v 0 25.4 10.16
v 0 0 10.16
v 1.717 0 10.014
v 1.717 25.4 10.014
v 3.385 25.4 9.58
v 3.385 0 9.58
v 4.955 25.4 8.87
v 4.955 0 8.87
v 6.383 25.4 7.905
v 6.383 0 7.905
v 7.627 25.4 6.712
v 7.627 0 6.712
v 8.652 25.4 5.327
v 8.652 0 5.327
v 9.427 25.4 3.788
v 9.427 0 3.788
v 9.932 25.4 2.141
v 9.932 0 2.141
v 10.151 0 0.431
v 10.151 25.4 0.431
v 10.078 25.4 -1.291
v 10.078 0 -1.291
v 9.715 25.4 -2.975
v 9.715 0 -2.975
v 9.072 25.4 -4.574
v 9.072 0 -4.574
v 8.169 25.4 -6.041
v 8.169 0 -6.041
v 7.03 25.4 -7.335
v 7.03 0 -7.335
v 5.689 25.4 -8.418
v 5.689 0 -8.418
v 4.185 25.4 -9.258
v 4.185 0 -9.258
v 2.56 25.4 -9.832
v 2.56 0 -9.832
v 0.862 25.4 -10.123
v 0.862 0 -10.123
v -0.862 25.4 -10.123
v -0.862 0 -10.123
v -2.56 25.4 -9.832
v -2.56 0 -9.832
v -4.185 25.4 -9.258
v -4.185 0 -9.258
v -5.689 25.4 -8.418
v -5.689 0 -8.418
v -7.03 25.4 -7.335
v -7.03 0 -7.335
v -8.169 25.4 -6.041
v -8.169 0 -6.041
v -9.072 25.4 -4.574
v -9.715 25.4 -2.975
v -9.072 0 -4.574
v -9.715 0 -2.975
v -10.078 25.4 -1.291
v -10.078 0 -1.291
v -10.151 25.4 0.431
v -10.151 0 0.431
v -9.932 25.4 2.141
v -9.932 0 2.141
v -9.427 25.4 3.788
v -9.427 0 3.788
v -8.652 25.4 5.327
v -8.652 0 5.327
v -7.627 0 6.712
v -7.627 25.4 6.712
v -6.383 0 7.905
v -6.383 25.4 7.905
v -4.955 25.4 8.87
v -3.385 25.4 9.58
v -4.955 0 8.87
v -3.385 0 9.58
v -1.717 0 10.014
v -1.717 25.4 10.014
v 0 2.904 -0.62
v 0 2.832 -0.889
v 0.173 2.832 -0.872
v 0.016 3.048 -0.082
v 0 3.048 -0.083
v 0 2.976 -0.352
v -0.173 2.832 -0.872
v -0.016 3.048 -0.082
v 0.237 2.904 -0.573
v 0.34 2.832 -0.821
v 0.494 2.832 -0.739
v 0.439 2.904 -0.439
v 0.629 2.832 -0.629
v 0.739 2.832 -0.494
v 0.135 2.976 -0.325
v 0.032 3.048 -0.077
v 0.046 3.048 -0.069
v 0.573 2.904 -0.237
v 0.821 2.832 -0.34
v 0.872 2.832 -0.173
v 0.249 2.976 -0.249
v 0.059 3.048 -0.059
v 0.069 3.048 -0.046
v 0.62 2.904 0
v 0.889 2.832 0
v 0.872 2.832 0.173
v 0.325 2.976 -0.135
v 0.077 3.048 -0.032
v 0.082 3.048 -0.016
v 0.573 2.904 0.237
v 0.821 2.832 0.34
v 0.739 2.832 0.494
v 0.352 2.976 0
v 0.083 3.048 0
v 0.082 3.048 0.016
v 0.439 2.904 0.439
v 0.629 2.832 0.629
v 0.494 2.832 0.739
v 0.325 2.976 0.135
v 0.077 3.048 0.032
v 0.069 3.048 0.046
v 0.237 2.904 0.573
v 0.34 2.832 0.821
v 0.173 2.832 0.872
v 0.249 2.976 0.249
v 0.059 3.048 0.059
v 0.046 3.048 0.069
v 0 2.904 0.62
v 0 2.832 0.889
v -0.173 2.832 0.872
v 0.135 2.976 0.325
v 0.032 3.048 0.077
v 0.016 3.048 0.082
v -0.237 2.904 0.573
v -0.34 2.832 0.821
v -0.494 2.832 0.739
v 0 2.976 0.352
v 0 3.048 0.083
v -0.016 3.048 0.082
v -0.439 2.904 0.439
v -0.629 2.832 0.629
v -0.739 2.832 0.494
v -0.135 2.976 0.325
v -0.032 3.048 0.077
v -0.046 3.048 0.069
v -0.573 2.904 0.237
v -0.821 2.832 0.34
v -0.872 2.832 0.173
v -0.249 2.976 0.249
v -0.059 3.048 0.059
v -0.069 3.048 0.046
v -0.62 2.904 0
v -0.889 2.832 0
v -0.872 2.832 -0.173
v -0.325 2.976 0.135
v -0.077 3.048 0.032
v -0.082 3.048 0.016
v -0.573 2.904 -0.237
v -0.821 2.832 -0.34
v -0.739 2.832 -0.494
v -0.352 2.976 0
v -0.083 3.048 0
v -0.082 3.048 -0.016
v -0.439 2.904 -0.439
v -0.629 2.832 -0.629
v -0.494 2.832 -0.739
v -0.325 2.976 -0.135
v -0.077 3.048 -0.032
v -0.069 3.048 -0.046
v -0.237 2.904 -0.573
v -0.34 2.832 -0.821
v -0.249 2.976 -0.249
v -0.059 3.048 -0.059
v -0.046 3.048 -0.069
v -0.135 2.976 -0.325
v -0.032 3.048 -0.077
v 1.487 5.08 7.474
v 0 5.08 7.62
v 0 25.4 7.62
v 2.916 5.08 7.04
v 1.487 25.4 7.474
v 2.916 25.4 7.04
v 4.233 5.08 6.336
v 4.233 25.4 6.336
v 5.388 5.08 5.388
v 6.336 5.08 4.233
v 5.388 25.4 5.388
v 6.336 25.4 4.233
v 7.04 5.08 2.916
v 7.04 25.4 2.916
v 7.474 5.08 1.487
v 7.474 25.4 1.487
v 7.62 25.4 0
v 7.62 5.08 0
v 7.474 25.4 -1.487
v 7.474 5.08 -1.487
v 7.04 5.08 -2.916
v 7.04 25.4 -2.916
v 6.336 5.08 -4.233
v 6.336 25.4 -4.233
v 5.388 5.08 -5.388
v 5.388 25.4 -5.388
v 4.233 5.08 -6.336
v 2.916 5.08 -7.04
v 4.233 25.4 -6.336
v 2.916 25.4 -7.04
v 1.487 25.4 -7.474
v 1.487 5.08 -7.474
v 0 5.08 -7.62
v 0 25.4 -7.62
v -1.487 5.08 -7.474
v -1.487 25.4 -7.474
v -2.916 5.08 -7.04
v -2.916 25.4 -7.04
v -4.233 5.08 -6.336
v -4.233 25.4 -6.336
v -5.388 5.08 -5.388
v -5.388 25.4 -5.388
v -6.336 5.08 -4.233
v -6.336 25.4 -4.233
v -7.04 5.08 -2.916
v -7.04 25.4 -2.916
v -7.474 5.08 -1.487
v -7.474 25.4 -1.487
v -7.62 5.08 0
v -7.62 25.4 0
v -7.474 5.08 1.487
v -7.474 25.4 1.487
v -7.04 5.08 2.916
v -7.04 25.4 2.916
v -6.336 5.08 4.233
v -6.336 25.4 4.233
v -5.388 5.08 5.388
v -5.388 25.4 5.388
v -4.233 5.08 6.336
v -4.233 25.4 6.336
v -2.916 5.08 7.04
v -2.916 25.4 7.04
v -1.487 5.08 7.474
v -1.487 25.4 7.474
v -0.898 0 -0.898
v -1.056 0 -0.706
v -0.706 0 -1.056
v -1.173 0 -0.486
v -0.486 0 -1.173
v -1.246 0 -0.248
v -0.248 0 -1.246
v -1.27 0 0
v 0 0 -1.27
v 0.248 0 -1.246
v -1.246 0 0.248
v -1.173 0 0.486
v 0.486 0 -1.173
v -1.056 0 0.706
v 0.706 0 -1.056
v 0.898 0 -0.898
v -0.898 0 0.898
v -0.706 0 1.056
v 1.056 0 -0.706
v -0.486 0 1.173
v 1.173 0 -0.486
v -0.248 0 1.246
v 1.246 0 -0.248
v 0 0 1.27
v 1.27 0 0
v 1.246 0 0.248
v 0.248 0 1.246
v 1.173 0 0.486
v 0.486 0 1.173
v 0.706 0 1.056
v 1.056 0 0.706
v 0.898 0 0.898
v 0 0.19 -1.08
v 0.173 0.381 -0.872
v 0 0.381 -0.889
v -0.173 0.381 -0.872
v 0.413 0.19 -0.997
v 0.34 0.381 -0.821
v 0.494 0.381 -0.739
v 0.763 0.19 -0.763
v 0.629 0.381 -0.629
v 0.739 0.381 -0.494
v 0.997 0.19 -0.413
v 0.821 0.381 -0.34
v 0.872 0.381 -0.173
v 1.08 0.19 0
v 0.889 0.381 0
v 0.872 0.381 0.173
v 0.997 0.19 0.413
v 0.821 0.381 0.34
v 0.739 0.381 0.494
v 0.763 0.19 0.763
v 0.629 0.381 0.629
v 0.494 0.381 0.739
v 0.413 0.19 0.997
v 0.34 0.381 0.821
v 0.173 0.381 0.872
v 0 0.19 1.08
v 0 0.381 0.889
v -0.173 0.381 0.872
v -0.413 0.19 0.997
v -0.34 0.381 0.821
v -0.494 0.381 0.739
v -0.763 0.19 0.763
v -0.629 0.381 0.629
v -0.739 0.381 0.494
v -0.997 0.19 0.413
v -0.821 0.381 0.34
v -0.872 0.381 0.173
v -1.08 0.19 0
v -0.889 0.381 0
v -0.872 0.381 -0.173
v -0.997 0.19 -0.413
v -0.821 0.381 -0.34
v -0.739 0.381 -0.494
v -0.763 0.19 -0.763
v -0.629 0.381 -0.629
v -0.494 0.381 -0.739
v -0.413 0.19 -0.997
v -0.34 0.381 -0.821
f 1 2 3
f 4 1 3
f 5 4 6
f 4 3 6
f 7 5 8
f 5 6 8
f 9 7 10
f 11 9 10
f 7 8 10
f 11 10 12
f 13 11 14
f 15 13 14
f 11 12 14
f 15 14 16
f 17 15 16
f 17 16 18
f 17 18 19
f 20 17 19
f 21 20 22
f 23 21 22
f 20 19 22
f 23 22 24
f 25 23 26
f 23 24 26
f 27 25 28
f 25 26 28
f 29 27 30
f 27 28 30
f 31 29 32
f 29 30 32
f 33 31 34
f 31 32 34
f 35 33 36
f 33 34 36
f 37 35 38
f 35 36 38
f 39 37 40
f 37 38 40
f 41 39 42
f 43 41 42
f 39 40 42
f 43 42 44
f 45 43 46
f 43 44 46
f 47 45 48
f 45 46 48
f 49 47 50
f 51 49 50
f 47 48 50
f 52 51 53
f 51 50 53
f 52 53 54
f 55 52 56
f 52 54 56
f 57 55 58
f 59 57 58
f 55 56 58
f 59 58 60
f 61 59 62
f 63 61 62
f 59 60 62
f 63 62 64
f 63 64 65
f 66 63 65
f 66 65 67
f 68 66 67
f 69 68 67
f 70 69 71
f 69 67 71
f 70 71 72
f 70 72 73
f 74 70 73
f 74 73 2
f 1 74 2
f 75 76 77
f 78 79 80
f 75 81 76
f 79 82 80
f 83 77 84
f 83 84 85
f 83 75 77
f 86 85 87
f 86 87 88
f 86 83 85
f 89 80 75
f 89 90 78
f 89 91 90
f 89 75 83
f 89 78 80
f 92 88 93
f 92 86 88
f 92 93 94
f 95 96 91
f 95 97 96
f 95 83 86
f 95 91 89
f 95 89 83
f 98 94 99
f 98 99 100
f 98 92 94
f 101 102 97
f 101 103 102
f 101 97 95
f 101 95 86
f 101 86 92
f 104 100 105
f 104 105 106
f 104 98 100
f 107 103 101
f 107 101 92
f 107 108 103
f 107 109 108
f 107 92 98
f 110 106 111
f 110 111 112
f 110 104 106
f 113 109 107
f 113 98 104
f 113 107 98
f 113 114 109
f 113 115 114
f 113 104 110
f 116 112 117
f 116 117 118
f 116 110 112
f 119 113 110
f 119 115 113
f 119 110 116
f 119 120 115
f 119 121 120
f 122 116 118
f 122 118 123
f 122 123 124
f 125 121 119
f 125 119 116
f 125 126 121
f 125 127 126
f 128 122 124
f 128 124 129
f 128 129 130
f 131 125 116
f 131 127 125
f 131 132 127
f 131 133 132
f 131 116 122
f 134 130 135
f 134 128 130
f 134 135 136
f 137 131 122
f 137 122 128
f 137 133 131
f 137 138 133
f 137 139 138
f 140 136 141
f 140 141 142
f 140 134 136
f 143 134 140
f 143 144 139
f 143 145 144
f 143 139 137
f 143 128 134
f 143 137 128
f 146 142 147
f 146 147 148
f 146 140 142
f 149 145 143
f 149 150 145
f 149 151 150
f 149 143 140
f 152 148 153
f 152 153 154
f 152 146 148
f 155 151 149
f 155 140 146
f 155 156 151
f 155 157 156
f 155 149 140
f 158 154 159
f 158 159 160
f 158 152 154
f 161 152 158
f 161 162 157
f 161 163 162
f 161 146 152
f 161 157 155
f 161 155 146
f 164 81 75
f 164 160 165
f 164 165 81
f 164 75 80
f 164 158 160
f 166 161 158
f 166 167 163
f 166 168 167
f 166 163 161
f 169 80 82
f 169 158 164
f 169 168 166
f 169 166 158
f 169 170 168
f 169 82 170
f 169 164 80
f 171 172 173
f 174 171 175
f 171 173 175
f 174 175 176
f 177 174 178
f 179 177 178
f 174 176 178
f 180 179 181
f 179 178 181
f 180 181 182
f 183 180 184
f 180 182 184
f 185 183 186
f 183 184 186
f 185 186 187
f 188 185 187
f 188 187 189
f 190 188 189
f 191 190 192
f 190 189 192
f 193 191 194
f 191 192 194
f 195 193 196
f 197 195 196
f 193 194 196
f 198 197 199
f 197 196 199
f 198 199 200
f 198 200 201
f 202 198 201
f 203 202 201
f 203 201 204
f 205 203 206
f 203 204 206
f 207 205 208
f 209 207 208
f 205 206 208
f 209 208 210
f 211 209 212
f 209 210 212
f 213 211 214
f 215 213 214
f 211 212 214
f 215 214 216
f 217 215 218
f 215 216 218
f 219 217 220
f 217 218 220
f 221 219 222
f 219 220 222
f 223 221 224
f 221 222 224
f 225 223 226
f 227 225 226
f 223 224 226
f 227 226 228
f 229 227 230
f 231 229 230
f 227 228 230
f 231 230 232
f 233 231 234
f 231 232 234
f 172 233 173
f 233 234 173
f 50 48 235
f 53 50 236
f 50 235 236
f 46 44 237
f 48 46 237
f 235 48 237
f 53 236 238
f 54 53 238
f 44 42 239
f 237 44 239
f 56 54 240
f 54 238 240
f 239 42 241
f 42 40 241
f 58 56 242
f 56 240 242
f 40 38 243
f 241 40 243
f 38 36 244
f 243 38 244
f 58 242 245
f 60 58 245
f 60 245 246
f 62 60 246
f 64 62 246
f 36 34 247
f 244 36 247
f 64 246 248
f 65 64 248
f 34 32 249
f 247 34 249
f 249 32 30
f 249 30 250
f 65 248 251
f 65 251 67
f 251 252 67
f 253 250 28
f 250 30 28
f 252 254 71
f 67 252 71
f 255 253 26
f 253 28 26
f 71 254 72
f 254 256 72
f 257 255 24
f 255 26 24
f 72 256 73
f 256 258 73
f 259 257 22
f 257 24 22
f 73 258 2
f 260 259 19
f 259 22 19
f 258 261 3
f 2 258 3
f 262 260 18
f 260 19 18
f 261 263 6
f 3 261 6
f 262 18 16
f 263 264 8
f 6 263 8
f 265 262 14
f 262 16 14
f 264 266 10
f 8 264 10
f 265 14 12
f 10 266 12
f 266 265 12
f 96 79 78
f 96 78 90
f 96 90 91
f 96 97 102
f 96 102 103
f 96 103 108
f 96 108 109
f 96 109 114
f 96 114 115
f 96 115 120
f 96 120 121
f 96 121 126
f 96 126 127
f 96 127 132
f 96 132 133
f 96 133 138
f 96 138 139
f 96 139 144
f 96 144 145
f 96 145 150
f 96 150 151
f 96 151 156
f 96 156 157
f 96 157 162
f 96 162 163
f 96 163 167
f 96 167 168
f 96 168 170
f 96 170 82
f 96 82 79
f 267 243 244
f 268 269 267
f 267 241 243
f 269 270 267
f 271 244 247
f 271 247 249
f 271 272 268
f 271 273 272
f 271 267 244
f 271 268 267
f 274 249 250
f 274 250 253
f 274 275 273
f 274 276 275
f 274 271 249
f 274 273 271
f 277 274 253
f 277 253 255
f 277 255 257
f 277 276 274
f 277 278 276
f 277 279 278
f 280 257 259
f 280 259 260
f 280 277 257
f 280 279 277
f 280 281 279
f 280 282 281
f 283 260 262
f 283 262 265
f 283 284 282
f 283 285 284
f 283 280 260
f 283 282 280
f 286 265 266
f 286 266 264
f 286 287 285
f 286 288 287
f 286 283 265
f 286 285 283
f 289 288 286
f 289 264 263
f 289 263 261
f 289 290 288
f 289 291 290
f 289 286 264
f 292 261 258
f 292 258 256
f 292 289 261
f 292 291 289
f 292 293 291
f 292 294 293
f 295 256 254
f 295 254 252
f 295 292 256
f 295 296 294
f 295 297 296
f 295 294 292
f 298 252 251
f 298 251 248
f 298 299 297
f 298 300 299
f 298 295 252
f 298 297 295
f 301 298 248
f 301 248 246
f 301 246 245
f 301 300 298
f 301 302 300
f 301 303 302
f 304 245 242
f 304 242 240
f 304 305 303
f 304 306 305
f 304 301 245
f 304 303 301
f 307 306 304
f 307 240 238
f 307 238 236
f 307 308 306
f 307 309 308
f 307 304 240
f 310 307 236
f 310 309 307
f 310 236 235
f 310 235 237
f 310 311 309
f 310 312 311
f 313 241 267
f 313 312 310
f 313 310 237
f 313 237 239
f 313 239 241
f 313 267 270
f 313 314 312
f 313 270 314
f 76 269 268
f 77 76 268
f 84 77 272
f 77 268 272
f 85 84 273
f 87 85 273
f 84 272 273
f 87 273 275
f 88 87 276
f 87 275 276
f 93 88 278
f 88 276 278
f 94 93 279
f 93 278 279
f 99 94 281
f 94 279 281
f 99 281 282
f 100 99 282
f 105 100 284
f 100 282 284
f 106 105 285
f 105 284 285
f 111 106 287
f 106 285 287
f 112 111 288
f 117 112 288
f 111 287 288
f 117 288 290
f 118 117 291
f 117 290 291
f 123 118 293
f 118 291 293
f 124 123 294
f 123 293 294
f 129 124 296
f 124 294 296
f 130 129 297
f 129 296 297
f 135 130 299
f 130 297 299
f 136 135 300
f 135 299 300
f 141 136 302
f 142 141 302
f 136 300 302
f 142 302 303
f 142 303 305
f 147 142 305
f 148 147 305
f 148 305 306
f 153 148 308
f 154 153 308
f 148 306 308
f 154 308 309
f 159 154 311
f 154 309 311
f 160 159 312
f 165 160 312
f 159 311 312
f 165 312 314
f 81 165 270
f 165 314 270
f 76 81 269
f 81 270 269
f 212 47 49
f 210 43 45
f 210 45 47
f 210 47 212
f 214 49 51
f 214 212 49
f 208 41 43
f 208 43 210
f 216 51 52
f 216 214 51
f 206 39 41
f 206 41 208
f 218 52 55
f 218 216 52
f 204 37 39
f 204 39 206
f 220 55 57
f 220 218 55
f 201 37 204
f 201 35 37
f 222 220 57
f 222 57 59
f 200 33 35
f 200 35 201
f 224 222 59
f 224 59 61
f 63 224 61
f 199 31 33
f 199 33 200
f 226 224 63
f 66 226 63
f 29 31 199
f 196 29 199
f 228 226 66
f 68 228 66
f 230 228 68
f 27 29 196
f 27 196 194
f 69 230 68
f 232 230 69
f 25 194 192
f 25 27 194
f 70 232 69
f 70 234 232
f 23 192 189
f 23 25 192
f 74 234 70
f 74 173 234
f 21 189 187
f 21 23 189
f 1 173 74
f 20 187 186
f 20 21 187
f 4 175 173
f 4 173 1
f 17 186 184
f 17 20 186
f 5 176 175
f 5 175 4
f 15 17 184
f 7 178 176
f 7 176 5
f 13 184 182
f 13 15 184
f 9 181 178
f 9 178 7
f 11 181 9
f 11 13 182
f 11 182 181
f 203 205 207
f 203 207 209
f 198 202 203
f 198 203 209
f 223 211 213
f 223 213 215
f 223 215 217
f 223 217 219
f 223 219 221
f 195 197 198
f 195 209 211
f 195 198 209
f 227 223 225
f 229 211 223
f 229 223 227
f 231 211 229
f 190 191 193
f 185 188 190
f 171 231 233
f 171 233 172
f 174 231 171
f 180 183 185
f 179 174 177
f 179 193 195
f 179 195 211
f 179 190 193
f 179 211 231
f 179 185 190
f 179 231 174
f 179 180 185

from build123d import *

# Parameters (mm, degrees)
SKETCH2_R           = 10.16
BOSS_EXTRUDE1_DEPTH = 25.4
SKETCH3_R           = 7.62
CUT_EXTRUDE1_DEPTH  = 20.32
SKETCH4_R           = 0.889
CUT_EXTRUDE2_DEPTH  = 3.048
CHAMFER1_SIZE       = 0.381
CHAMFER2_SIZE       = 0.2159
CHAMFER2_SIZE2      = 0.805749769


with BuildPart() as part:
    # Sketch2 → Boss-Extrude1 (new body)
    with BuildSketch(Plane(origin=(0, 0, 0), x_dir=(1, 0, 0), z_dir=(0, 1, 0))):
        with Locations(Location((0, 0, 0), (0, 0, 270))):
            Circle(SKETCH2_R)
    extrude(amount=BOSS_EXTRUDE1_DEPTH)

    # Sketch3 → Cut-Extrude1 (cut)
    with BuildSketch(Plane(origin=(0, 25.4, 0), x_dir=(1, 0, 0), z_dir=(0, 1, 0))):
        with Locations(Location((0, 0, 0), (0, 0, 270))):
            Circle(SKETCH3_R)
    extrude(amount=-CUT_EXTRUDE1_DEPTH, mode=Mode.SUBTRACT)

    # Sketch4 → Cut-Extrude2 (cut)
    with BuildSketch(Plane.XZ):
        with Locations(Location((0, 0, 0), (0, 0, 270))):
            Circle(SKETCH4_R)
    extrude(amount=-CUT_EXTRUDE2_DEPTH, mode=Mode.SUBTRACT)

    # Chamfer1
    chamfer1_edges = [part.edges().sort_by_distance(p)[0] for p in [
        (0, 0, 0.889),
    ]]
    chamfer(chamfer1_edges, length=CHAMFER1_SIZE)

    # Chamfer2
    chamfer2_edges = [part.edges().sort_by_distance(p)[0] for p in [
        (0, 3.048, 0.889),
    ]]
    chamfer2_side = [part.faces().sort_by_distance(p)[0] for p in [
        (0, 1.7145, 0.889),
    ]]
    chamfer(chamfer2_edges, length=CHAMFER2_SIZE, length2=CHAMFER2_SIZE2, reference=chamfer2_side[0])


solid = part.part
